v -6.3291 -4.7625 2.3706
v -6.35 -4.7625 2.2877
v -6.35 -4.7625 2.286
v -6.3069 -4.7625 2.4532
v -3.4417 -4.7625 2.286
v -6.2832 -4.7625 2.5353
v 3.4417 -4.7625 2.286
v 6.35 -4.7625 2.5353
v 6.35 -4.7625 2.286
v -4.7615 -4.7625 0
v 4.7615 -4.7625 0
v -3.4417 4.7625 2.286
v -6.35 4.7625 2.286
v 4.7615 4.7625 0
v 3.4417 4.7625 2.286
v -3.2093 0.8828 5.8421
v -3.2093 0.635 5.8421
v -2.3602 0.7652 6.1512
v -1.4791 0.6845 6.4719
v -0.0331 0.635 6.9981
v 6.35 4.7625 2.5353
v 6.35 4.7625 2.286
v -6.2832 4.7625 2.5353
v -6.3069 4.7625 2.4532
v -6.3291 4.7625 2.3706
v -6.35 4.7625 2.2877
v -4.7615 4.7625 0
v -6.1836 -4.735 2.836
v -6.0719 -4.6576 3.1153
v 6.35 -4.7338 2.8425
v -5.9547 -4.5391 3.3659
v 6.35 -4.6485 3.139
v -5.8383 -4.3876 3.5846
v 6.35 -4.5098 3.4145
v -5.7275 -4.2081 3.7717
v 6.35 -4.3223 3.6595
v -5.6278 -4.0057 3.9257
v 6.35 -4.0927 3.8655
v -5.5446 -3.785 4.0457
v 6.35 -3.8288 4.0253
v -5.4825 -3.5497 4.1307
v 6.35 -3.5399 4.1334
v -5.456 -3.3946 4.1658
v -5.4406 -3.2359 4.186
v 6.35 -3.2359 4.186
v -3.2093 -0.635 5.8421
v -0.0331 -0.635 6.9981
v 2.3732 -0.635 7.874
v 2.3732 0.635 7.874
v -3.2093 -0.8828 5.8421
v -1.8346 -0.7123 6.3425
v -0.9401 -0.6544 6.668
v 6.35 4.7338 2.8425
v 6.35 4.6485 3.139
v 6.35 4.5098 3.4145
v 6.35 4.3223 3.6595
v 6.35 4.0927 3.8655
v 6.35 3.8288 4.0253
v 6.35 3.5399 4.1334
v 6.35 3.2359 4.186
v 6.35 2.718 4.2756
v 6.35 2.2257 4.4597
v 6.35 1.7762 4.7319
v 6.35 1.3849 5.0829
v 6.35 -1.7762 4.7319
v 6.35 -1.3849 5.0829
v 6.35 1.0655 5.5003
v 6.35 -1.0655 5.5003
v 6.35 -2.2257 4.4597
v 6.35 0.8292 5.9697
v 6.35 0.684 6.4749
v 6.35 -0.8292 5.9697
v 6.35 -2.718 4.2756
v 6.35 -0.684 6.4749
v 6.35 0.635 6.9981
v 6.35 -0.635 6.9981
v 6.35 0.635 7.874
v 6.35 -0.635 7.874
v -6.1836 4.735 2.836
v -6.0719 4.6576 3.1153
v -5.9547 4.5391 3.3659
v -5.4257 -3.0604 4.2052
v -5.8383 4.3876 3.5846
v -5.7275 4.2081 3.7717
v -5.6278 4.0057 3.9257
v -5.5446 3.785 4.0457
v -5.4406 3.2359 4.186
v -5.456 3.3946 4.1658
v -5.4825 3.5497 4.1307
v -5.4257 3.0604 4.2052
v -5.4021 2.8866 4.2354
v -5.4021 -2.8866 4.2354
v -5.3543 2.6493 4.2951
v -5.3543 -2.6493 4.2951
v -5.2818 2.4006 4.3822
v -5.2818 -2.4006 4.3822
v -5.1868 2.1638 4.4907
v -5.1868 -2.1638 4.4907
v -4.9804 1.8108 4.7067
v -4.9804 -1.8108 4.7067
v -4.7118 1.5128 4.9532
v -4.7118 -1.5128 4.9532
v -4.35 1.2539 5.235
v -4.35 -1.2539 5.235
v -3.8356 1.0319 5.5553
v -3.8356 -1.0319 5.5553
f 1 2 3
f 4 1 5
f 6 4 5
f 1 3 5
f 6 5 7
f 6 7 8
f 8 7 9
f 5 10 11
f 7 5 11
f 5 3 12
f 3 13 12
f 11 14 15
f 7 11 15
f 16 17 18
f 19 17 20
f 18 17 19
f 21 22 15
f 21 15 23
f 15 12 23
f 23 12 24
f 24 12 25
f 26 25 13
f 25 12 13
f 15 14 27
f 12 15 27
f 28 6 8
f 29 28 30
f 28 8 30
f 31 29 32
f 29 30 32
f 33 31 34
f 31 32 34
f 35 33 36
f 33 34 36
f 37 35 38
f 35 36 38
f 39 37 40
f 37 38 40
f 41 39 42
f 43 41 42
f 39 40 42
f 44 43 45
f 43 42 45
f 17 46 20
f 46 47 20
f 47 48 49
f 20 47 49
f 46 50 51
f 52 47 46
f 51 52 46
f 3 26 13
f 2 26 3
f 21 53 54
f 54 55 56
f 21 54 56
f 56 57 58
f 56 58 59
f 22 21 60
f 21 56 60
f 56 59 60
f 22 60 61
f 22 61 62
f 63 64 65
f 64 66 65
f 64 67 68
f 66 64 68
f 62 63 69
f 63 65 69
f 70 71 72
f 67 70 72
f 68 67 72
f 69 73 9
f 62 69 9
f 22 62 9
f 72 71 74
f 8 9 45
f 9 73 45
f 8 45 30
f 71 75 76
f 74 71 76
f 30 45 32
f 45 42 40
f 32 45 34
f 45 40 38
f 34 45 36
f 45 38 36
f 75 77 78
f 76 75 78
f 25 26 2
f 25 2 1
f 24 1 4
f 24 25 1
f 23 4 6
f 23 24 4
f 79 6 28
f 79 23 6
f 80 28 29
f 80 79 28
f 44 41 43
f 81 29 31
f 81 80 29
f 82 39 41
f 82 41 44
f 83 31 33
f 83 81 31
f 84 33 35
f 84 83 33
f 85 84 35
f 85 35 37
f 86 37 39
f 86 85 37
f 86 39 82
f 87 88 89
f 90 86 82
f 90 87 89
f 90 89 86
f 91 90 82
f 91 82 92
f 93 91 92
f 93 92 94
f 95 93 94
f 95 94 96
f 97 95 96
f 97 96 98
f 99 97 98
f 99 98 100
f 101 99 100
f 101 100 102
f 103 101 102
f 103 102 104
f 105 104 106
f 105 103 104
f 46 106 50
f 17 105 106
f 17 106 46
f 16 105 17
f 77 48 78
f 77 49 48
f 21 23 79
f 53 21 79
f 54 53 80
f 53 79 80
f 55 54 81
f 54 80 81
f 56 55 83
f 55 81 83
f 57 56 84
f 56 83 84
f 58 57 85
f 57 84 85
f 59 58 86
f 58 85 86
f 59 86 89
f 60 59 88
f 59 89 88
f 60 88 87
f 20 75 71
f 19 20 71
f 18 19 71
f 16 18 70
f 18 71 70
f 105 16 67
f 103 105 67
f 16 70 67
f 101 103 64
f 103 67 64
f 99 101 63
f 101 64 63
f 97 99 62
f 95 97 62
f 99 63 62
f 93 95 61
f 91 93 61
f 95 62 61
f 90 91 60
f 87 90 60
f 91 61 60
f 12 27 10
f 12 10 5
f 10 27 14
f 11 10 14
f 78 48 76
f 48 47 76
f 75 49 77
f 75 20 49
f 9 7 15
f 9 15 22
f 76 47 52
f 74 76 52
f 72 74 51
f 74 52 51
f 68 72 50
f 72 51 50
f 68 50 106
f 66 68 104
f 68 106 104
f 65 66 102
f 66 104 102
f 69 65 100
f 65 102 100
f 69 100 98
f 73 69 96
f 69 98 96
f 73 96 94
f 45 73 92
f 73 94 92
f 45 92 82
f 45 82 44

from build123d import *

# Parameters (mm, degrees)
F0_W         = 9.525
F0_H         = 9.525
F1_DEPTH     = 2.286
F2_T1_DEPTH  = 21.3619144247
F3_W         = 2.9083
F3_H         = 9.525
F3_W_2       = 6.8834
F4_DEPTH     = 1.905
F5_R         = 1.6556676611
F6_W         = 12.7
F6_H         = 1.27
F7_DEPTH     = 3.683
F8_SIZE2     = 8.7232408068
F8_SIZE      = 3.175
F9_T4_DEPTH  = 12.7
F9_T9_DEPTH  = 12.7
F10_T1_DEPTH = 20.6733949541


# Not quite as in the source:
# - a fillet or chamfer that OpenCascade refuses, or shapes differently, is made with other operations: its cross-section is extruded or revolved along the edge and cut away or added


with BuildPart() as f1:
    # F0 (on Top) → F1 (new body)
    with BuildSketch(Plane.XY):
        Rectangle(F0_W, F0_H)
    extrude(amount=F1_DEPTH)

    # F2: chamfer of 1.3208 x 2.2876927066 on 2 edges, made by hand

    # F2_s2 → F2_t1 (cut)
    with BuildSketch(Plane.XZ.offset(-10.6809572123)):
        Polygon((-4.7625, -0.0016927066), (-3.4417, 2.286), (-4.7625, 2.286), align=None)
        Polygon((4.7625, -0.0016927066), (3.4417, 2.286), (4.7625, 2.286), align=None)
    extrude(amount=F2_T1_DEPTH, mode=Mode.SUBTRACT)

    # F3 (on face) → F4 (join)
    with BuildSketch(Plane.XY.offset(2.286)):
        with Locations((4.89585, 0)):
            Rectangle(F3_W, F3_H)
        Rectangle(F3_W_2, F3_H)
        with Locations((-4.89585, 0)):
            Rectangle(F3_W, F3_H)
    extrude(amount=F4_DEPTH)

    # F5
    f5_edges = [f1.edges().sort_by_distance(p)[0] for p in [
        (0, 4.7625, 4.191),
        (0, -4.7625, 4.191),
    ]]
    fillet(f5_edges, radius=F5_R)

    # F6 (on face) → F7 (join)
    with BuildSketch(Plane.XY.offset(4.191)):
        Rectangle(F6_W, F6_H)
    extrude(amount=F7_DEPTH)

    # F8
    f8_edges = [f1.edges().sort_by_distance(p)[0] for p in [
        (-6.35, 0, 7.874),
    ]]
    f8_side = f1.faces().sort_by_distance((-6.35, 0, 3.810575))[0]
    chamfer(f8_edges, length=F8_SIZE, length2=F8_SIZE2, reference=f8_side)

    # F9: fillet of radius 2.8207671263 on 2 edges, made by hand


with BuildPart() as f9_tool2:
    # F9_s3 → F9_t4 (new body)
    with BuildSketch(Plane.YZ.offset(-6.35)):
        with BuildLine():
            ThreePointArc((-0.635, 6.9981468006), (-1.3849039981, 5.0828783899), (-3.235890411, 4.1859623453))
            Line((-3.235890411, 4.1859623453), (-3.2139027394, 3.9047438998))
            ThreePointArc((-3.2139027394, 3.9047438998), (-3.1068323389, 3.9089232874), (-0.635, 3.9089232874))
            Line((-0.635, 3.9089232874), (-0.3529232874, 4.191))
            Line((-0.3529232874, 4.191), (-0.3529232874, 6.9981468006))
            Line((-0.3529232874, 6.9981468006), (-0.635, 6.9981468006))
        make_face()
    extrude(amount=F9_T4_DEPTH)

    split(bisect_by=Plane(origin=(-2.2530383821, 0, 6.1901720799), x_dir=(0, 1, 0), z_dir=(0.3420201433, 0, -0.9396926208)), keep=Keep.TOP)


with BuildPart() as f1_1:
    add(f1.part)

    # F9_t1: union F9_tool2
    add(f9_tool2.part)


with BuildPart() as f9_tool7:
    # F9_s8 → F9_t9 (new body)
    with BuildSketch(Plane.YZ.offset(6.35)):
        with BuildLine():
            ThreePointArc((0.635, 6.9981468006), (1.3849039981, 5.0828783899), (3.235890411, 4.1859623453))
            Line((3.235890411, 4.1859623453), (3.2139027394, 3.9047438998))
            ThreePointArc((3.2139027394, 3.9047438998), (3.1068323389, 3.9089232874), (0.635, 3.9089232874))
            Line((0.635, 3.9089232874), (0.3529232874, 4.191))
            Line((0.3529232874, 4.191), (0.3529232874, 6.9981468006))
            Line((0.3529232874, 6.9981468006), (0.635, 6.9981468006))
        make_face()
    extrude(amount=-F9_T9_DEPTH)

    split(bisect_by=Plane(origin=(-2.2530383821, 0, 6.1901720799), x_dir=(0, 1, 0), z_dir=(0.3420201433, 0, -0.9396926208)), keep=Keep.TOP)


with BuildPart() as f1_2:
    add(f1_1.part)

    # F9_t6: union F9_tool7
    add(f9_tool7.part)

    # F10: fillet of radius 5.08 on 1 edges, made by hand

    # F10_s2 → F10_t1 (cut)
    with BuildSketch(Plane.XZ.offset(-10.336697477)):
        with BuildLine():
            ThreePointArc((-6.3503887376, 2.2860942499), (-5.1990968175, 4.4769990033), (-3.1494899918, 5.8643160486))
            Line((-3.1494899918, 5.8643160486), (-3.3233118727, 6.3418877414))
            ThreePointArc((-3.3233118727, 6.3418877414), (-4.9234984728, 5.7590417786), (-6.5238218809, 5.1765716928))
            Line((-6.5238218809, 5.1765716928), (-6.8582211803, 4.699))
            ThreePointArc((-6.8582211803, 4.699), (-6.8582211803, 3.492547125), (-6.8443004931, 2.4058437629))
            Line((-6.8443004931, 2.4058437629), (-6.3503887376, 2.2860942499))
        make_face()
    extrude(amount=F10_T1_DEPTH, mode=Mode.SUBTRACT)


solid = f1_2.part
